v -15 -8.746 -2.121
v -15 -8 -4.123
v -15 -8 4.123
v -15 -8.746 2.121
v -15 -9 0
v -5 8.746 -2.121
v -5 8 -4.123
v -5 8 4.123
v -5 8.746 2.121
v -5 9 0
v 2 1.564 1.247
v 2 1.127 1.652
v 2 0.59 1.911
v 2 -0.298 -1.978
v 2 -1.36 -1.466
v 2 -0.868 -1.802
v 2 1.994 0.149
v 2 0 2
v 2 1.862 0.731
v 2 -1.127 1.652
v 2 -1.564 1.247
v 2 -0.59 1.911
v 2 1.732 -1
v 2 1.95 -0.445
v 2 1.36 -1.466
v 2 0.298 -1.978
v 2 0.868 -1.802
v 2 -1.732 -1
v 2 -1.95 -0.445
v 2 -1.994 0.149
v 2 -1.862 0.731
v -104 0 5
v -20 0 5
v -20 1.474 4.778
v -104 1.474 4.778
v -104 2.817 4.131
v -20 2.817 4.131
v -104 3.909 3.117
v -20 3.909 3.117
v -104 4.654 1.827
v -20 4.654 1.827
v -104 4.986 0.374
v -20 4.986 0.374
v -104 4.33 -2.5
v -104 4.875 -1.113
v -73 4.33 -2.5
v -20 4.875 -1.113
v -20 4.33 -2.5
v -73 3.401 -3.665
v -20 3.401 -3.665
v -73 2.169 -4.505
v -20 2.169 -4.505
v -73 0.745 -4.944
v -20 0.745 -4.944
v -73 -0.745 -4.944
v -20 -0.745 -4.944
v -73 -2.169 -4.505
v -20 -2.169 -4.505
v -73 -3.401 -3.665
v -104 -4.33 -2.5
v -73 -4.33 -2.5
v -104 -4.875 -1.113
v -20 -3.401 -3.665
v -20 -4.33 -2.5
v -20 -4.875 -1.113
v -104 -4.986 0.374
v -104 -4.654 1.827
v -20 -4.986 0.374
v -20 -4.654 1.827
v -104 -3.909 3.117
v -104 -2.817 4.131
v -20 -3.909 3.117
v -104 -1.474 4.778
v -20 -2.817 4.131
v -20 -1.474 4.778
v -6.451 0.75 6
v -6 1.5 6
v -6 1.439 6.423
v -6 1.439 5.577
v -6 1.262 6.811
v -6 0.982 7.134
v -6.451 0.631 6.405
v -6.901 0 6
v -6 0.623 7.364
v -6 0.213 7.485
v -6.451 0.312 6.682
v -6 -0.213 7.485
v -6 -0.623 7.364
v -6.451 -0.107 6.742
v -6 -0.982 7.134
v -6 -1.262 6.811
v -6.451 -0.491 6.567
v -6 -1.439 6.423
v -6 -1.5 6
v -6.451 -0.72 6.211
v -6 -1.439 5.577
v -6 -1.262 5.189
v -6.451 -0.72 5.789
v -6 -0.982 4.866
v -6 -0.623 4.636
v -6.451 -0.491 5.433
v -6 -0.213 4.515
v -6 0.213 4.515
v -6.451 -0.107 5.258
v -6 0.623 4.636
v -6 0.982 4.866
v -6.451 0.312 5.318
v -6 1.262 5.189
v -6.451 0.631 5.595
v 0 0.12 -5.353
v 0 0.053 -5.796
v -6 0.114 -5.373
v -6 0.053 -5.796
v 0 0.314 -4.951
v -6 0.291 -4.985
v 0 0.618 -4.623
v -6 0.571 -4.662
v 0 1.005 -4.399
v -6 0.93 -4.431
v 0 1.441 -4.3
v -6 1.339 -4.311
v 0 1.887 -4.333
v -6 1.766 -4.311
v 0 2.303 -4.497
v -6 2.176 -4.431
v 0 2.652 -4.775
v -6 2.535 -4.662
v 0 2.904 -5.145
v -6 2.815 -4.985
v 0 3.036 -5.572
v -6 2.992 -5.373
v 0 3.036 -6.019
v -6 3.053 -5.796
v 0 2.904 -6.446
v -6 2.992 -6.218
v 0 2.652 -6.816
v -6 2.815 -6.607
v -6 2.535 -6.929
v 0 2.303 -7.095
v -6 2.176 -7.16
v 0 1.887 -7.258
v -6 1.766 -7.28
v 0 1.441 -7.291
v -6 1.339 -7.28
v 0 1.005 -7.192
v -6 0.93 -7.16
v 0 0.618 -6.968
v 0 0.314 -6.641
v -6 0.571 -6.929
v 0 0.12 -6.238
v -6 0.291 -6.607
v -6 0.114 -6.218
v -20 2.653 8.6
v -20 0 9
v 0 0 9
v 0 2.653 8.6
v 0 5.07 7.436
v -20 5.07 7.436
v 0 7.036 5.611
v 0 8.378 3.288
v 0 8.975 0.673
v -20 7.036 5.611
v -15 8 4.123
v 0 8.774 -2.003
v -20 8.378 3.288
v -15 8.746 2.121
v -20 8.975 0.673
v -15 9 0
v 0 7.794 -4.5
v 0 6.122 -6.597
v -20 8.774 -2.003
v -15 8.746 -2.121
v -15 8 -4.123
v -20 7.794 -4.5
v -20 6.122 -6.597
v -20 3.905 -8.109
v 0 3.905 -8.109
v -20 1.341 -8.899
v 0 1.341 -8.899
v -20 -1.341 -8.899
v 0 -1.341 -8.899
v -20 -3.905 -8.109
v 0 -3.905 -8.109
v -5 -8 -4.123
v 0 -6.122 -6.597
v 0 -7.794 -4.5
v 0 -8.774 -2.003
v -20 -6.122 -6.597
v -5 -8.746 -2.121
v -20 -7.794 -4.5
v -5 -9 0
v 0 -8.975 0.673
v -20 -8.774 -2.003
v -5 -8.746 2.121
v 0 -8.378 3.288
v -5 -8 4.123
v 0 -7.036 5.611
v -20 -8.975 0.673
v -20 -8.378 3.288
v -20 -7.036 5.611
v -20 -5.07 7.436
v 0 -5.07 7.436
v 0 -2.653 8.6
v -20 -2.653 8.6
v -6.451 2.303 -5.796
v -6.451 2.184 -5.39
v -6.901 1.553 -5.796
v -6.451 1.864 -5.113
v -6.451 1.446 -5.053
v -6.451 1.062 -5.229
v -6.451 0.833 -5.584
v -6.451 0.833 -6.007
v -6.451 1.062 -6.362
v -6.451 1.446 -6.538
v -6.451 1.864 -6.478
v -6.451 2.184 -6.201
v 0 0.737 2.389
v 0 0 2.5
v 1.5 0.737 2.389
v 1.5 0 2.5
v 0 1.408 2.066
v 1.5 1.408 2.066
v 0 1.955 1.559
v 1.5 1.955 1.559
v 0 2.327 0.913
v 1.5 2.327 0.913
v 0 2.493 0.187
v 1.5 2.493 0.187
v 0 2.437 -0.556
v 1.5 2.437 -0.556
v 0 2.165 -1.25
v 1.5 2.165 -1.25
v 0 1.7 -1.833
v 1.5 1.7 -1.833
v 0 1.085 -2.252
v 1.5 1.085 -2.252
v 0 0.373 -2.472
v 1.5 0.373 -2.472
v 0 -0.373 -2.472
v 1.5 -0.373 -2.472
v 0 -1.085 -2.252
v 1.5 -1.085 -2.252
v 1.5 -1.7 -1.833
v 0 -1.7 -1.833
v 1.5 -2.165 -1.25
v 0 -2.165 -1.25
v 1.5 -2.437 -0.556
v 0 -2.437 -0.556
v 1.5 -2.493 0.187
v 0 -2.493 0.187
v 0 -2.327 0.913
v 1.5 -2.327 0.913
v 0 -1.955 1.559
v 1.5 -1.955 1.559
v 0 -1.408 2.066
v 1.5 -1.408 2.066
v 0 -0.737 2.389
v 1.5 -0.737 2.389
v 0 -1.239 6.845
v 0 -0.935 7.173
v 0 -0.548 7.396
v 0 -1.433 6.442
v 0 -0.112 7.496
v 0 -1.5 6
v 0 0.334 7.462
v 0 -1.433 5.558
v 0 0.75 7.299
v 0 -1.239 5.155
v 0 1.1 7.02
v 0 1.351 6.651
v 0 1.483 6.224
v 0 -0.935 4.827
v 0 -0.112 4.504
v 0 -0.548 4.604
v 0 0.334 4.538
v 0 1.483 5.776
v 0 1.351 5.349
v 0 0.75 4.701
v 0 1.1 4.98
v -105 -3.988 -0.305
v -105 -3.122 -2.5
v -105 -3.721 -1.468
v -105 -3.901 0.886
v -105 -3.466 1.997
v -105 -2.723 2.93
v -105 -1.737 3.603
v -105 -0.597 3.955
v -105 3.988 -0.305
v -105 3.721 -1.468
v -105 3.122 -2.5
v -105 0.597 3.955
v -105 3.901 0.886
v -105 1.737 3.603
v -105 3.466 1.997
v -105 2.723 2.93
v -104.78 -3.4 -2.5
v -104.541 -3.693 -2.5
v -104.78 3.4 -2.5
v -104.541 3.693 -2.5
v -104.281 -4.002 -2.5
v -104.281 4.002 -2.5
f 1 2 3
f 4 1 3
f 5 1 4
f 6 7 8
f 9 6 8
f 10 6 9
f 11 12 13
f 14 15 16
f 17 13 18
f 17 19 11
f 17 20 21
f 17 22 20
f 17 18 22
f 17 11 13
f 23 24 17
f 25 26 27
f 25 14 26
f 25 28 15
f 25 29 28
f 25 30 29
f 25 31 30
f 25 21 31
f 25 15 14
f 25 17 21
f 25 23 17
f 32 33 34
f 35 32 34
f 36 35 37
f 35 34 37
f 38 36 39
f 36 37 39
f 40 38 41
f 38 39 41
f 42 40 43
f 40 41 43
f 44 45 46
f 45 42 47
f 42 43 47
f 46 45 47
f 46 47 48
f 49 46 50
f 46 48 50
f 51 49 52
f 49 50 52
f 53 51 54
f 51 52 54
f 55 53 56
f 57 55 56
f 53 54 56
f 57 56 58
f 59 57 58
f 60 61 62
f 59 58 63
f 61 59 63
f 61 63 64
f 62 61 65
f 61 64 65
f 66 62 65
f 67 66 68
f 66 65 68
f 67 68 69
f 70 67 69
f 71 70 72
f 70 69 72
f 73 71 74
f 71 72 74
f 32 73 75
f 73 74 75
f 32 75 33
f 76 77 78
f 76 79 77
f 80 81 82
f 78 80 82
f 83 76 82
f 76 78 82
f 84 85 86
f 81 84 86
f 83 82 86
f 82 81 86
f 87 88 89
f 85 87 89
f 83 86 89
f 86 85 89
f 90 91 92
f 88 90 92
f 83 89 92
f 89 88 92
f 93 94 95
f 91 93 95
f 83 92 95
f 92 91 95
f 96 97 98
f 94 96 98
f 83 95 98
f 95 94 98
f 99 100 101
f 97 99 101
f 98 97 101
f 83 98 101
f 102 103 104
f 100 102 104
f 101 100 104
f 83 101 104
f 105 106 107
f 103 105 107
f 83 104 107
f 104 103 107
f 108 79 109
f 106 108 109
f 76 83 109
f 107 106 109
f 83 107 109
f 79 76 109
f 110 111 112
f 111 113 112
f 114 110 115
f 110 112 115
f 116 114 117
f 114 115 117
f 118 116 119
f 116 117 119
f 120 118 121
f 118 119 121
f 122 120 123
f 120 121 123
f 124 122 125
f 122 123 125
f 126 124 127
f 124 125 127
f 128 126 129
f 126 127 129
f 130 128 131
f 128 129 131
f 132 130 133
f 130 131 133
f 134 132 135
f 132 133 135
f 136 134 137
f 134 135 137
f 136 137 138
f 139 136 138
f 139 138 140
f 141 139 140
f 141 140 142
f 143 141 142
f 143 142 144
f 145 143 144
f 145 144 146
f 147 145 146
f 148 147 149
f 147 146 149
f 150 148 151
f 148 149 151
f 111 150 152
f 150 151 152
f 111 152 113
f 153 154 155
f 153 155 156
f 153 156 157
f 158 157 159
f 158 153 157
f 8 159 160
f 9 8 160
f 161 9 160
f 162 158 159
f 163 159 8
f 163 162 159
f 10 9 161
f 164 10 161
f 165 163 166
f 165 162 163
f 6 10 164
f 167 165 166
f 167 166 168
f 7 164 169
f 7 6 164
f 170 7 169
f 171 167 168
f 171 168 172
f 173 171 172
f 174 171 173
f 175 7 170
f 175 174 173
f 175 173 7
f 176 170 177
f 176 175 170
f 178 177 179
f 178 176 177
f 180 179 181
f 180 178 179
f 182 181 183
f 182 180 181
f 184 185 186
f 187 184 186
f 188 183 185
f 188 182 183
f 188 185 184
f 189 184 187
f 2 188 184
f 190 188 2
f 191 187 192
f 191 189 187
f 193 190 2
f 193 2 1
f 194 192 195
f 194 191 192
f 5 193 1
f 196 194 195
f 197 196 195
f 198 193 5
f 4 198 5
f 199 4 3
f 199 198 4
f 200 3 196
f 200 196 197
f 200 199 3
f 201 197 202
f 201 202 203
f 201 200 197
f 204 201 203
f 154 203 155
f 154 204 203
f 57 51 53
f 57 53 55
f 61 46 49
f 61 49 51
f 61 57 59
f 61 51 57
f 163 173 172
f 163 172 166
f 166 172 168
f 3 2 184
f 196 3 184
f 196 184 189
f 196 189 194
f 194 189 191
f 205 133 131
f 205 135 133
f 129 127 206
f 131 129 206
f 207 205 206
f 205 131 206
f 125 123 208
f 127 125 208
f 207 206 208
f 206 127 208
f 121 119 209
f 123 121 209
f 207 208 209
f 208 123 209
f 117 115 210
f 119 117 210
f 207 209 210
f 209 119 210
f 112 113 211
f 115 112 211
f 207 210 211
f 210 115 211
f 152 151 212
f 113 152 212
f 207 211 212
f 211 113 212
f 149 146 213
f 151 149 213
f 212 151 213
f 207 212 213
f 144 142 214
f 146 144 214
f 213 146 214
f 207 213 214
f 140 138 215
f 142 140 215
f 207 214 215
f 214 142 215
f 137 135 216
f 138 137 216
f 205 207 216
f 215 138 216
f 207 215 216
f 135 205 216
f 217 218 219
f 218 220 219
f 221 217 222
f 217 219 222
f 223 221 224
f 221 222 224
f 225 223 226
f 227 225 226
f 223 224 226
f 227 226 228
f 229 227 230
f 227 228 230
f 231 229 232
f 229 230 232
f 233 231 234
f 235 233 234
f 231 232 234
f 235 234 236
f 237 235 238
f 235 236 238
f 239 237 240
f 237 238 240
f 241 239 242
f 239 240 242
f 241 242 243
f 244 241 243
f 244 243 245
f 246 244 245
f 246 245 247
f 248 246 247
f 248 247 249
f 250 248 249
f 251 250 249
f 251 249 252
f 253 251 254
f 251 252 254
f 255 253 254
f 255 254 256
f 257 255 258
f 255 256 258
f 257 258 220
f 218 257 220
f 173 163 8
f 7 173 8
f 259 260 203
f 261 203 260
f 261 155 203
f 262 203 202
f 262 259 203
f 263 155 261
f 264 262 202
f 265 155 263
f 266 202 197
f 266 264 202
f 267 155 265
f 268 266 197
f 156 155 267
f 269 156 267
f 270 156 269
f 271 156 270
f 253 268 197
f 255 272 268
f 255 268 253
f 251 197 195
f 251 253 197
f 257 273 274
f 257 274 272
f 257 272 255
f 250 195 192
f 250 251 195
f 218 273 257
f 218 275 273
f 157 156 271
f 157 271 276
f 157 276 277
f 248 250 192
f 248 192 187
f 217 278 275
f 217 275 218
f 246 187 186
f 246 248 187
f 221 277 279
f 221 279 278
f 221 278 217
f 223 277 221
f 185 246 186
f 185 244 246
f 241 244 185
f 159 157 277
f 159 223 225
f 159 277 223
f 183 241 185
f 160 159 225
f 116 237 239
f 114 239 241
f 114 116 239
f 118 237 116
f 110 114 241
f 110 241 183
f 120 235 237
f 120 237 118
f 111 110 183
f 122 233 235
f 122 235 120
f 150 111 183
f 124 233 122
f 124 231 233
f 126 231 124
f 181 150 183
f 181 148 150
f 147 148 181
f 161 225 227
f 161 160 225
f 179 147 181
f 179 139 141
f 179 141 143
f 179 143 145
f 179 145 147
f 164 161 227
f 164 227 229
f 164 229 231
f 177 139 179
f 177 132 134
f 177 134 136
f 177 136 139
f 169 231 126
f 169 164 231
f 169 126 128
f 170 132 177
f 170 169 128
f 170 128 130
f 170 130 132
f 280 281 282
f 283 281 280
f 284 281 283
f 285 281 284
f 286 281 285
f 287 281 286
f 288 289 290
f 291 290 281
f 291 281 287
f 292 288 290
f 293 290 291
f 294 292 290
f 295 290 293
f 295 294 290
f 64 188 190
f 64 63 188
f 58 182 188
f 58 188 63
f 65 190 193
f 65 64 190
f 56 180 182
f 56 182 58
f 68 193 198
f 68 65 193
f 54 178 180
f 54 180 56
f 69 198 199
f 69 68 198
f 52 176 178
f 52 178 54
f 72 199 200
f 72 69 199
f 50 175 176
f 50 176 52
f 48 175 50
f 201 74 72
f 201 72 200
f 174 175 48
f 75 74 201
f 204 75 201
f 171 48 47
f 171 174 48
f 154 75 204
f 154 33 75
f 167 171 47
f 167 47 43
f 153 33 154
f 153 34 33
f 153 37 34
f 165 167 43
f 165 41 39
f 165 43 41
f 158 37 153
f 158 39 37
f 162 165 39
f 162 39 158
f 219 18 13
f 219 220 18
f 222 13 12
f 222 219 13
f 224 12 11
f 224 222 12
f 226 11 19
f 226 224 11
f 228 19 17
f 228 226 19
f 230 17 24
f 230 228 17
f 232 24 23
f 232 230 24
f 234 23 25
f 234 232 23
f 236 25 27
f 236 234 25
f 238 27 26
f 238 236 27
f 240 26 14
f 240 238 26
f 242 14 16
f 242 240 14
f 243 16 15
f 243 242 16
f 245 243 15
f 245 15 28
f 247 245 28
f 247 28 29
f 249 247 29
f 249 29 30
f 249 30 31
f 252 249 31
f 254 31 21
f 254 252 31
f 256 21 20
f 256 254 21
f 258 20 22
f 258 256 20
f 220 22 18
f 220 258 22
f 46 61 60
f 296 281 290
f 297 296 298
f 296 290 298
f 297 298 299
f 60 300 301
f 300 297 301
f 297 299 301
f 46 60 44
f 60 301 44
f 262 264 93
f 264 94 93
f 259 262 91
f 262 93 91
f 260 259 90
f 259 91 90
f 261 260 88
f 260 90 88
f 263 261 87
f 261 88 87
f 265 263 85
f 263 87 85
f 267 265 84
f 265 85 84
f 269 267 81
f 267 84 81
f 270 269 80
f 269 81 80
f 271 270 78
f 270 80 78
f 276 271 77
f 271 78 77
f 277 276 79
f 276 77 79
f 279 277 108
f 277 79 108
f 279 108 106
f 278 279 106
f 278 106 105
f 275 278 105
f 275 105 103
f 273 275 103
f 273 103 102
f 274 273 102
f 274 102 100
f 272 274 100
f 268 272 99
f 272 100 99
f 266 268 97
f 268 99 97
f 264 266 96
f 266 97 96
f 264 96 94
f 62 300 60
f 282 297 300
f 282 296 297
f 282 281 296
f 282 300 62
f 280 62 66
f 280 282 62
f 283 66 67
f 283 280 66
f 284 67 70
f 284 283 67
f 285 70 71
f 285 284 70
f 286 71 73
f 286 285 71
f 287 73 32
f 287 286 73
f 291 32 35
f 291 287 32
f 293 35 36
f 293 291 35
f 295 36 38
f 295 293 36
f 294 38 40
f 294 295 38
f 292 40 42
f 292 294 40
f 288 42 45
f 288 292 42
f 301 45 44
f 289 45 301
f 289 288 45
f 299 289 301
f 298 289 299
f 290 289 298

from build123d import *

# Parameters (mm, degrees)
F0_W     = 1.5
F0_H     = 2.5
F0_W_2   = 84
F0_H_2   = 5
F0_W_3   = 6
F0_H_3   = 1.23
F0_H_4   = 0.27
F3_DEPTH = 32
F4_W     = 10
F4_H     = 1
F5_DEPTH = 12.5
F8_D     = 3
F8_DEPTH = 6
F8_TIP   = 0.9012909285


# Not quite as in the source:
# - ends of sketch curves that miss each other by under 0.0002 mm in the source are joined


with BuildPart() as f1:
    # F0 (on Front) → F1 (revolve)
    with BuildSketch(Plane.XZ):
        with Locations((0.75, 1.25)):
            Rectangle(F0_W, F0_H)
        Polygon((-10, 0), (-5, 0), (-5, 4.123106), align=None)
        Polygon((-8.210141, 6), (-7.5, 6), (-7.5, 7.23), align=None)
        Polygon((-15, 0), (-10, 0), (-15, 4.123106), align=None)
        with Locations((-62, 2.5)):
            Rectangle(F0_W_2, F0_H_2)
        Polygon((0, 0), (0, 2.5), (0, 4.5), (-6, 4.5), (-6.467654, 4.77), (-7.5, 4.77), (-8.210141, 6), (-7.5, 7.23), (-6.467654, 7.23), (-6, 7.5), (0, 7.5), (0, 9), (-20, 9), (-20, 5), (-20, 0), (-15, 0), (-15, 4.123106), (-5, 4.123106), (-5, 0), align=None)
        Polygon((-15, 4.123106), (-9.9999998364, 3.651e-07), (-5, 4.123106), align=None)
        with Locations((-3, 6.615)):
            Rectangle(F0_W_3, F0_H_3)
        Polygon((2, 2), (1.5, 2.5), (1.5, 0), (2, 0), align=None)
        with Locations((-3, 5.385)):
            Rectangle(F0_W_3, F0_H_3)
        Polygon((-7.5, 6), (-6, 6), (-6, 7.23), (-6.467654, 7.23), (-7.5, 7.23), align=None)
        Polygon((-6.467654, 4.77), (-6, 4.77), (-6, 6), (-7.5, 6), (-7.5, 4.77), align=None)
        Polygon((-8.210141, 6), (-7.5, 4.77), (-7.5, 6), align=None)
        with Locations((-3, 7.365)):
            Rectangle(F0_W_3, F0_H_4)
        with Locations((-3, 4.635)):
            Rectangle(F0_W_3, F0_H_4)
        Polygon((-6.467654, 4.77), (-6, 4.5), (-6, 4.77), align=None)
        Polygon((-6.467654, 7.23), (-6, 7.23), (-6, 7.5), align=None)
        Polygon((-105, 0), (-104, 0), (-104, 5), (-105, 4), align=None)
    revolve(axis=Axis((-53, 0, 0), (-1, 0, 0)))

    # F2 (on face) → F3 (cut)
    with BuildSketch(Plane(origin=(-105, 0, 0), x_dir=(0, -1, 0), z_dir=(-1, 0, 0))):
        with BuildLine():
            Line((-3.1224989992, -2.5), (-4.330127, -2.5))
            ThreePointArc((-4.3301270142, -2.5000000082), (0, -5), (4.3301270142, -2.5000000082))
            Line((4.330127, -2.5), (3.1224989992, -2.5))
            ThreePointArc((3.1224989992, -2.5), (0, -4), (-3.1224989992, -2.5))
        make_face()
        with BuildLine():
            Line((3.1224989992, -2.5), (-3.1224989992, -2.5))
            ThreePointArc((-3.1224989992, -2.5), (0, -4), (3.1224989992, -2.5))
        make_face()
    extrude(amount=-F3_DEPTH, mode=Mode.SUBTRACT)

    # F4 (on Top) → F5 (cut, symmetric)
    with BuildSketch(Plane.XY):
        with Locations((-10, -8.5)):
            Rectangle(F4_W, F4_H)
        with Locations((-10, 8.5)):
            Rectangle(F4_W, F4_H)
    extrude(amount=F5_DEPTH, both=True, mode=Mode.SUBTRACT)

    # F8
    with Locations(Plane.YZ):
        with Locations((0, 6), (1.552915, -5.795555)):
            Hole(F8_D / 2, depth=F8_DEPTH)
            with Locations((0, 0, -(F8_DEPTH + F8_TIP / 2))):  # 118° drill point
                Cone(0, F8_D / 2, F8_TIP, mode=Mode.SUBTRACT)


solid = f1.part
